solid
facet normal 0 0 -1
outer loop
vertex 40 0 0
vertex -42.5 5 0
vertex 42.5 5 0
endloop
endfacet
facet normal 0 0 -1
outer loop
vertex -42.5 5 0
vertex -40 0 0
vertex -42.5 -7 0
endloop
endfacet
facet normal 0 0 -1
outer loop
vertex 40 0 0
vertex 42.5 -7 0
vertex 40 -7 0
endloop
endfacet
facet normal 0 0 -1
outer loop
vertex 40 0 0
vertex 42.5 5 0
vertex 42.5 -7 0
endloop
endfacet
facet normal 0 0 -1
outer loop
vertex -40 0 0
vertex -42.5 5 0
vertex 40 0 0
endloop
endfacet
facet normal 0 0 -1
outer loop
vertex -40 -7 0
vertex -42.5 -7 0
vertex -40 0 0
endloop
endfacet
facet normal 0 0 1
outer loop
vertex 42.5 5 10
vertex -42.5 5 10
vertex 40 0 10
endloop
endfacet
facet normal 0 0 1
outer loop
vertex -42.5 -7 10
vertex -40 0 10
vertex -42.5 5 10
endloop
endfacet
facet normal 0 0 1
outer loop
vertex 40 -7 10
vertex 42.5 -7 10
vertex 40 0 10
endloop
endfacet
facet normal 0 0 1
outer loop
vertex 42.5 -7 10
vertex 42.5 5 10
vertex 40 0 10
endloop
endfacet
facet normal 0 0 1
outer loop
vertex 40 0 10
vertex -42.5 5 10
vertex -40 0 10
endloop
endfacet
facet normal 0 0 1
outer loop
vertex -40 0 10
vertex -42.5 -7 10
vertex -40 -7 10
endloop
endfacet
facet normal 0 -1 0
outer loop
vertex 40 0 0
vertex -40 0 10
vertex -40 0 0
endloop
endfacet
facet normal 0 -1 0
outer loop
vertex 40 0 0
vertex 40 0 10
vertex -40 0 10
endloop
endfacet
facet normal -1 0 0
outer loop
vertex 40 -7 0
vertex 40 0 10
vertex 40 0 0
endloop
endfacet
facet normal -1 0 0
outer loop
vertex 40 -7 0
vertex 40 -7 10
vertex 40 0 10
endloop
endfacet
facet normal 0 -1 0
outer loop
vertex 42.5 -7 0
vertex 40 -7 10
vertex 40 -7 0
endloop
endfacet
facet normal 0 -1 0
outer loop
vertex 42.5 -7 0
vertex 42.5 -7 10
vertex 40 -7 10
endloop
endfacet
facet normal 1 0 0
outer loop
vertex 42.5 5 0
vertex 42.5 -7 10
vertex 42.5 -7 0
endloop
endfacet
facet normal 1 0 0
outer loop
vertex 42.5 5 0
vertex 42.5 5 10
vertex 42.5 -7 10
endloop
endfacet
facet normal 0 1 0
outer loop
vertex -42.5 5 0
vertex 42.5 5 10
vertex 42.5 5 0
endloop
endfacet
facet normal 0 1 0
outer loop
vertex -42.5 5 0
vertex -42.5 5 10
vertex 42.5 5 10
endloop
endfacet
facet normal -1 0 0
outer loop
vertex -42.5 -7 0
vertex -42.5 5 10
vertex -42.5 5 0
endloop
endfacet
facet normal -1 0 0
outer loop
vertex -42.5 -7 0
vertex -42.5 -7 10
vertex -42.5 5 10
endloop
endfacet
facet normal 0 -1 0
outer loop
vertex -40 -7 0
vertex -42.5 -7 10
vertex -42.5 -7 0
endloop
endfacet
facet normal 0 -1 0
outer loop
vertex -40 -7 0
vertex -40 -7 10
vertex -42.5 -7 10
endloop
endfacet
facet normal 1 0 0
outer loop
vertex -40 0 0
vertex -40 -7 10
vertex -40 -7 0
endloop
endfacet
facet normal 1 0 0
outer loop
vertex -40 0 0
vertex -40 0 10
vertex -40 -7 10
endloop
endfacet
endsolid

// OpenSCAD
// file: ../lib/gridfinity.scad
// SPDX-License-Identifier: MIT
// Copyright (c) 2026 Aaron Cupp
//
// gridfinity.scad — shared Gridfinity baseplate + bin library (per spec).
//
// 42 mm pitch, 41.5 mm bins, baseplate socket 0.7/1.8/2.15 = 4.65 mm, 4 mm
// fillet; bin foot 0.8/1.8/2.15 = 4.75 mm, 3.75 mm corner radius. Verified the
// bin foot seats in the baseplate socket with ~0.25–0.5 mm clearance.
//
//   baseplate(nx, ny)                      — tiled receiving baseplate
//   bin_blank(nx, ny, h)                   — solid bin body (feet + block, no cavity)
//   bin(nx, ny, h, wall, floor)            — open Gridfinity bin
//   divided_bin(nx, ny, h, cols, rows, …)  — bin with internal compartments
//   lid(nx, ny, …)                         — friction lid for a bin of the same footprint
//   stack_base(nx, ny, h, …)               — baseplate-topped base; a bin socket-stacks on it

GF = 42; GF_FILLET = 4;
_C_TOP = 2.15; _C_MID = 1.8; _C_BOT = 0.7;
_BP_LIP = _C_TOP + _C_MID + _C_BOT; _BP_FLOOR = 1.2; BP_H = _BP_LIP + _BP_FLOOR;  // 5.85
BIN_SZ = 41.5; BIN_R = 3.75; BIN_BASE_H = 4.75;

// ---- baseplate ----
module _bp_cell(i = 0) { offset(r = -i) offset(r = GF_FILLET) offset(r = -GF_FILLET) square(GF, center = true); }
module _bp_socket() {
    e = 0.01;
    hull() { translate([0,0,BP_H-e]) linear_extrude(e) _bp_cell(0); translate([0,0,BP_H-_C_TOP]) linear_extrude(e) _bp_cell(_C_TOP); }
    translate([0,0,BP_H-_C_TOP-_C_MID]) linear_extrude(_C_MID) _bp_cell(_C_TOP);
    hull() { translate([0,0,BP_H-_C_TOP-_C_MID-e]) linear_extrude(e) _bp_cell(_C_TOP); translate([0,0,BP_H-_BP_LIP]) linear_extrude(e) _bp_cell(_C_TOP+_C_BOT); }
}
module baseplate(nx, ny) {
    w = nx*GF; d = ny*GF;
    difference() {
        translate([0,0,BP_H/2]) linear_extrude(BP_H, center=true) offset(GF_FILLET) offset(-GF_FILLET) square([w,d], center=true);
        for (ix=[0:nx-1], iy=[0:ny-1]) translate([(ix-(nx-1)/2)*GF, (iy-(ny-1)/2)*GF, 0]) _bp_socket();
    }
}

// ---- bin ----
module _bin_cell(i = 0) { offset(r = -i) offset(r = BIN_R) offset(r = -BIN_R) square(BIN_SZ, center = true); }
module _bin_foot() {
    e = 0.01;
    hull() { linear_extrude(e) _bin_cell(2.95); translate([0,0,0.8]) linear_extrude(e) _bin_cell(2.15); }    // bottom chamfer
    translate([0,0,0.8]) linear_extrude(1.8) _bin_cell(2.15);                                                 // vertical
    hull() { translate([0,0,2.6]) linear_extrude(e) _bin_cell(2.15); translate([0,0,BIN_BASE_H]) linear_extrude(e) _bin_cell(0); } // top chamfer
}
// Solid bin body: Gridfinity feet + the block above them, with no cavity cut.
// Cup-style bins (lib/vessel.scad) subtract their own bores from this instead of
// re-deriving the foot + shell union.
module bin_blank(nx, ny, h) {
    W = nx*GF - 0.5; D = ny*GF - 0.5;
    union() {
        for (ix=[0:nx-1], iy=[0:ny-1]) translate([(ix-(nx-1)/2)*GF, (iy-(ny-1)/2)*GF, 0]) _bin_foot();
        translate([0,0,BIN_BASE_H]) linear_extrude(h-BIN_BASE_H) offset(BIN_R) offset(-BIN_R) square([W,D], center=true);
    }
}

module _bin_shell(nx, ny, h, wall, floor) {
    W = nx*GF - 0.5; D = ny*GF - 0.5;
    difference() {
        bin_blank(nx, ny, h);
        translate([0,0,BIN_BASE_H+floor]) linear_extrude(h) offset(BIN_R-wall) offset(-(BIN_R-wall)) square([W-2*wall, D-2*wall], center=true);
    }
}
module bin(nx, ny, h, wall = 1.2, floor = 1.4) { _bin_shell(nx, ny, h, wall, floor); }

// ---- stacking base ----
// A bin whose TOP is a Gridfinity baseplate, so a standard bin socket-stacks on
// it (two-tier towers: instrument on top, cords/jig/adapters in the base). The
// base is open at the FRONT (−Y) by default so the lower item is reachable while
// the top tier stays socketed — same idea as drybox-splitter-stand's open cubby.
// The whole tower foots on the bench baseplate via this base's own foot.
//
//   h = interior height of the lower compartment (floor to the baseplate cap).
module stack_base(nx, ny, h, wall = 1.2, floor = 1.4, open_front = true) {
    W = nx*GF - 0.5; D = ny*GF - 0.5;
    z0 = BIN_BASE_H + floor;
    iw = W - 2*wall; id = D - 2*wall;
    difference() {
        union() {
            bin_blank(nx, ny, h);                    // solid foot + block to h
            translate([0,0,h]) baseplate(nx, ny);    // baseplate cap (sockets up)
        }
        // lower cavity, floor up to the cap underside
        translate([0,0,z0]) linear_extrude(h - z0 + 0.01)
            offset(BIN_R-wall) offset(-(BIN_R-wall)) square([iw, id], center=true);
        // open front: cut the −Y wall so you reach in under the cap
        if (open_front)
            translate([-iw/2, -D, z0]) cube([iw, D/2 + 0.01, h - z0 + 0.01]);
    }
}

module divided_bin(nx, ny, h, cols = 1, rows = 1, wall = 1.2, floor = 1.4, div = 1.2) {
    W = nx*GF - 0.5; D = ny*GF - 0.5;
    union() {
        bin(nx, ny, h, wall, floor);
        // internal divider walls (from the floor up to the rim)
        iw = W - 2*wall; id = D - 2*wall; z0 = BIN_BASE_H + floor;
        for (c = [1 : cols-1]) translate([-iw/2 + c*iw/cols - div/2, -id/2, z0]) cube([div, id, h - z0]);
        for (r = [1 : rows-1]) translate([-iw/2, -id/2 + r*id/rows - div/2, z0]) cube([iw, div, h - z0]);
    }
}

// ---- lid ----
// Friction lid for a bin of the same footprint: a flat plate with a skirt that
// drops into the bin's cavity. Emitted PRINT-READY — plate on the bed, skirt
// standing up — so it needs no supports. Flip it in your head to picture it
// fitted: the plate then caps the rim and the lid adds `t` to the stack height.
//
// Why lids exist here: full-extension drawer slides let small parts hop between
// compartments on a hard close, and brass inserts aren't magnetic — you can't
// sweep them back. `wall` must match the bin's wall so the skirt lands in the
// cavity; `clearance` is per-side slop between skirt and cavity.
module lid(nx, ny, t = 1.6, skirt = 4, wall = 1.2, clearance = 0.35, lid_wall = 1.6) {
    W = nx*GF - 0.5; D = ny*GF - 0.5;
    iw = W - 2*wall - 2*clearance; id = D - 2*wall - 2*clearance;   // skirt outer
    ir = BIN_R - wall;                                              // cavity corner radius
    union() {
        linear_extrude(t) offset(BIN_R) offset(-BIN_R) square([W, D], center=true);
        translate([0,0,t]) linear_extrude(skirt) difference() {
            offset(ir) offset(-ir) square([iw, id], center=true);
            offset(ir-lid_wall) offset(-(ir-lid_wall)) square([iw-2*lid_wall, id-2*lid_wall], center=true);
        }
    }
}
// main file
// frame_width_gauge — the width equivalent of frame_length_gauge. One job.
//
// A 10 mm strip carrying the two skirt walls at their real spacing, and nothing
// else. Lay it across the TOP of the supply; both skirts should drop over the
// sides snug, no rock.
//
// Span is 2*SKIRT_IN, the same expression the real frame uses.
//
// NOTE: this checks the case fit ONLY. It does not check the plate pocket —
// frame_test_section does that, at the cost of being a full four-sided slice.
//
// PRINT: flat as rendered. Profile extruded in Z: no overhangs, no supports.
include <shortkiller_common.scad>

GAUGE_D = 10.0;   // strip depth along the case
SPINE_T =  5.0;

SPAN = 2 * SKIRT_IN;   // what has to clear the case

linear_extrude(GAUGE_D)
    polygon([
        [-SKIRT_OUT, -SKIRT_D],
        [-SKIRT_IN,  -SKIRT_D],
        [-SKIRT_IN,   0],
        [ SKIRT_IN,   0],
        [ SKIRT_IN,  -SKIRT_D],
        [ SKIRT_OUT, -SKIRT_D],
        [ SKIRT_OUT,  SPINE_T],
        [-SKIRT_OUT,  SPINE_T],
    ]);

echo(str("clear span between skirts = ", SPAN, " mm  (case ", CASE_W, ")"));
